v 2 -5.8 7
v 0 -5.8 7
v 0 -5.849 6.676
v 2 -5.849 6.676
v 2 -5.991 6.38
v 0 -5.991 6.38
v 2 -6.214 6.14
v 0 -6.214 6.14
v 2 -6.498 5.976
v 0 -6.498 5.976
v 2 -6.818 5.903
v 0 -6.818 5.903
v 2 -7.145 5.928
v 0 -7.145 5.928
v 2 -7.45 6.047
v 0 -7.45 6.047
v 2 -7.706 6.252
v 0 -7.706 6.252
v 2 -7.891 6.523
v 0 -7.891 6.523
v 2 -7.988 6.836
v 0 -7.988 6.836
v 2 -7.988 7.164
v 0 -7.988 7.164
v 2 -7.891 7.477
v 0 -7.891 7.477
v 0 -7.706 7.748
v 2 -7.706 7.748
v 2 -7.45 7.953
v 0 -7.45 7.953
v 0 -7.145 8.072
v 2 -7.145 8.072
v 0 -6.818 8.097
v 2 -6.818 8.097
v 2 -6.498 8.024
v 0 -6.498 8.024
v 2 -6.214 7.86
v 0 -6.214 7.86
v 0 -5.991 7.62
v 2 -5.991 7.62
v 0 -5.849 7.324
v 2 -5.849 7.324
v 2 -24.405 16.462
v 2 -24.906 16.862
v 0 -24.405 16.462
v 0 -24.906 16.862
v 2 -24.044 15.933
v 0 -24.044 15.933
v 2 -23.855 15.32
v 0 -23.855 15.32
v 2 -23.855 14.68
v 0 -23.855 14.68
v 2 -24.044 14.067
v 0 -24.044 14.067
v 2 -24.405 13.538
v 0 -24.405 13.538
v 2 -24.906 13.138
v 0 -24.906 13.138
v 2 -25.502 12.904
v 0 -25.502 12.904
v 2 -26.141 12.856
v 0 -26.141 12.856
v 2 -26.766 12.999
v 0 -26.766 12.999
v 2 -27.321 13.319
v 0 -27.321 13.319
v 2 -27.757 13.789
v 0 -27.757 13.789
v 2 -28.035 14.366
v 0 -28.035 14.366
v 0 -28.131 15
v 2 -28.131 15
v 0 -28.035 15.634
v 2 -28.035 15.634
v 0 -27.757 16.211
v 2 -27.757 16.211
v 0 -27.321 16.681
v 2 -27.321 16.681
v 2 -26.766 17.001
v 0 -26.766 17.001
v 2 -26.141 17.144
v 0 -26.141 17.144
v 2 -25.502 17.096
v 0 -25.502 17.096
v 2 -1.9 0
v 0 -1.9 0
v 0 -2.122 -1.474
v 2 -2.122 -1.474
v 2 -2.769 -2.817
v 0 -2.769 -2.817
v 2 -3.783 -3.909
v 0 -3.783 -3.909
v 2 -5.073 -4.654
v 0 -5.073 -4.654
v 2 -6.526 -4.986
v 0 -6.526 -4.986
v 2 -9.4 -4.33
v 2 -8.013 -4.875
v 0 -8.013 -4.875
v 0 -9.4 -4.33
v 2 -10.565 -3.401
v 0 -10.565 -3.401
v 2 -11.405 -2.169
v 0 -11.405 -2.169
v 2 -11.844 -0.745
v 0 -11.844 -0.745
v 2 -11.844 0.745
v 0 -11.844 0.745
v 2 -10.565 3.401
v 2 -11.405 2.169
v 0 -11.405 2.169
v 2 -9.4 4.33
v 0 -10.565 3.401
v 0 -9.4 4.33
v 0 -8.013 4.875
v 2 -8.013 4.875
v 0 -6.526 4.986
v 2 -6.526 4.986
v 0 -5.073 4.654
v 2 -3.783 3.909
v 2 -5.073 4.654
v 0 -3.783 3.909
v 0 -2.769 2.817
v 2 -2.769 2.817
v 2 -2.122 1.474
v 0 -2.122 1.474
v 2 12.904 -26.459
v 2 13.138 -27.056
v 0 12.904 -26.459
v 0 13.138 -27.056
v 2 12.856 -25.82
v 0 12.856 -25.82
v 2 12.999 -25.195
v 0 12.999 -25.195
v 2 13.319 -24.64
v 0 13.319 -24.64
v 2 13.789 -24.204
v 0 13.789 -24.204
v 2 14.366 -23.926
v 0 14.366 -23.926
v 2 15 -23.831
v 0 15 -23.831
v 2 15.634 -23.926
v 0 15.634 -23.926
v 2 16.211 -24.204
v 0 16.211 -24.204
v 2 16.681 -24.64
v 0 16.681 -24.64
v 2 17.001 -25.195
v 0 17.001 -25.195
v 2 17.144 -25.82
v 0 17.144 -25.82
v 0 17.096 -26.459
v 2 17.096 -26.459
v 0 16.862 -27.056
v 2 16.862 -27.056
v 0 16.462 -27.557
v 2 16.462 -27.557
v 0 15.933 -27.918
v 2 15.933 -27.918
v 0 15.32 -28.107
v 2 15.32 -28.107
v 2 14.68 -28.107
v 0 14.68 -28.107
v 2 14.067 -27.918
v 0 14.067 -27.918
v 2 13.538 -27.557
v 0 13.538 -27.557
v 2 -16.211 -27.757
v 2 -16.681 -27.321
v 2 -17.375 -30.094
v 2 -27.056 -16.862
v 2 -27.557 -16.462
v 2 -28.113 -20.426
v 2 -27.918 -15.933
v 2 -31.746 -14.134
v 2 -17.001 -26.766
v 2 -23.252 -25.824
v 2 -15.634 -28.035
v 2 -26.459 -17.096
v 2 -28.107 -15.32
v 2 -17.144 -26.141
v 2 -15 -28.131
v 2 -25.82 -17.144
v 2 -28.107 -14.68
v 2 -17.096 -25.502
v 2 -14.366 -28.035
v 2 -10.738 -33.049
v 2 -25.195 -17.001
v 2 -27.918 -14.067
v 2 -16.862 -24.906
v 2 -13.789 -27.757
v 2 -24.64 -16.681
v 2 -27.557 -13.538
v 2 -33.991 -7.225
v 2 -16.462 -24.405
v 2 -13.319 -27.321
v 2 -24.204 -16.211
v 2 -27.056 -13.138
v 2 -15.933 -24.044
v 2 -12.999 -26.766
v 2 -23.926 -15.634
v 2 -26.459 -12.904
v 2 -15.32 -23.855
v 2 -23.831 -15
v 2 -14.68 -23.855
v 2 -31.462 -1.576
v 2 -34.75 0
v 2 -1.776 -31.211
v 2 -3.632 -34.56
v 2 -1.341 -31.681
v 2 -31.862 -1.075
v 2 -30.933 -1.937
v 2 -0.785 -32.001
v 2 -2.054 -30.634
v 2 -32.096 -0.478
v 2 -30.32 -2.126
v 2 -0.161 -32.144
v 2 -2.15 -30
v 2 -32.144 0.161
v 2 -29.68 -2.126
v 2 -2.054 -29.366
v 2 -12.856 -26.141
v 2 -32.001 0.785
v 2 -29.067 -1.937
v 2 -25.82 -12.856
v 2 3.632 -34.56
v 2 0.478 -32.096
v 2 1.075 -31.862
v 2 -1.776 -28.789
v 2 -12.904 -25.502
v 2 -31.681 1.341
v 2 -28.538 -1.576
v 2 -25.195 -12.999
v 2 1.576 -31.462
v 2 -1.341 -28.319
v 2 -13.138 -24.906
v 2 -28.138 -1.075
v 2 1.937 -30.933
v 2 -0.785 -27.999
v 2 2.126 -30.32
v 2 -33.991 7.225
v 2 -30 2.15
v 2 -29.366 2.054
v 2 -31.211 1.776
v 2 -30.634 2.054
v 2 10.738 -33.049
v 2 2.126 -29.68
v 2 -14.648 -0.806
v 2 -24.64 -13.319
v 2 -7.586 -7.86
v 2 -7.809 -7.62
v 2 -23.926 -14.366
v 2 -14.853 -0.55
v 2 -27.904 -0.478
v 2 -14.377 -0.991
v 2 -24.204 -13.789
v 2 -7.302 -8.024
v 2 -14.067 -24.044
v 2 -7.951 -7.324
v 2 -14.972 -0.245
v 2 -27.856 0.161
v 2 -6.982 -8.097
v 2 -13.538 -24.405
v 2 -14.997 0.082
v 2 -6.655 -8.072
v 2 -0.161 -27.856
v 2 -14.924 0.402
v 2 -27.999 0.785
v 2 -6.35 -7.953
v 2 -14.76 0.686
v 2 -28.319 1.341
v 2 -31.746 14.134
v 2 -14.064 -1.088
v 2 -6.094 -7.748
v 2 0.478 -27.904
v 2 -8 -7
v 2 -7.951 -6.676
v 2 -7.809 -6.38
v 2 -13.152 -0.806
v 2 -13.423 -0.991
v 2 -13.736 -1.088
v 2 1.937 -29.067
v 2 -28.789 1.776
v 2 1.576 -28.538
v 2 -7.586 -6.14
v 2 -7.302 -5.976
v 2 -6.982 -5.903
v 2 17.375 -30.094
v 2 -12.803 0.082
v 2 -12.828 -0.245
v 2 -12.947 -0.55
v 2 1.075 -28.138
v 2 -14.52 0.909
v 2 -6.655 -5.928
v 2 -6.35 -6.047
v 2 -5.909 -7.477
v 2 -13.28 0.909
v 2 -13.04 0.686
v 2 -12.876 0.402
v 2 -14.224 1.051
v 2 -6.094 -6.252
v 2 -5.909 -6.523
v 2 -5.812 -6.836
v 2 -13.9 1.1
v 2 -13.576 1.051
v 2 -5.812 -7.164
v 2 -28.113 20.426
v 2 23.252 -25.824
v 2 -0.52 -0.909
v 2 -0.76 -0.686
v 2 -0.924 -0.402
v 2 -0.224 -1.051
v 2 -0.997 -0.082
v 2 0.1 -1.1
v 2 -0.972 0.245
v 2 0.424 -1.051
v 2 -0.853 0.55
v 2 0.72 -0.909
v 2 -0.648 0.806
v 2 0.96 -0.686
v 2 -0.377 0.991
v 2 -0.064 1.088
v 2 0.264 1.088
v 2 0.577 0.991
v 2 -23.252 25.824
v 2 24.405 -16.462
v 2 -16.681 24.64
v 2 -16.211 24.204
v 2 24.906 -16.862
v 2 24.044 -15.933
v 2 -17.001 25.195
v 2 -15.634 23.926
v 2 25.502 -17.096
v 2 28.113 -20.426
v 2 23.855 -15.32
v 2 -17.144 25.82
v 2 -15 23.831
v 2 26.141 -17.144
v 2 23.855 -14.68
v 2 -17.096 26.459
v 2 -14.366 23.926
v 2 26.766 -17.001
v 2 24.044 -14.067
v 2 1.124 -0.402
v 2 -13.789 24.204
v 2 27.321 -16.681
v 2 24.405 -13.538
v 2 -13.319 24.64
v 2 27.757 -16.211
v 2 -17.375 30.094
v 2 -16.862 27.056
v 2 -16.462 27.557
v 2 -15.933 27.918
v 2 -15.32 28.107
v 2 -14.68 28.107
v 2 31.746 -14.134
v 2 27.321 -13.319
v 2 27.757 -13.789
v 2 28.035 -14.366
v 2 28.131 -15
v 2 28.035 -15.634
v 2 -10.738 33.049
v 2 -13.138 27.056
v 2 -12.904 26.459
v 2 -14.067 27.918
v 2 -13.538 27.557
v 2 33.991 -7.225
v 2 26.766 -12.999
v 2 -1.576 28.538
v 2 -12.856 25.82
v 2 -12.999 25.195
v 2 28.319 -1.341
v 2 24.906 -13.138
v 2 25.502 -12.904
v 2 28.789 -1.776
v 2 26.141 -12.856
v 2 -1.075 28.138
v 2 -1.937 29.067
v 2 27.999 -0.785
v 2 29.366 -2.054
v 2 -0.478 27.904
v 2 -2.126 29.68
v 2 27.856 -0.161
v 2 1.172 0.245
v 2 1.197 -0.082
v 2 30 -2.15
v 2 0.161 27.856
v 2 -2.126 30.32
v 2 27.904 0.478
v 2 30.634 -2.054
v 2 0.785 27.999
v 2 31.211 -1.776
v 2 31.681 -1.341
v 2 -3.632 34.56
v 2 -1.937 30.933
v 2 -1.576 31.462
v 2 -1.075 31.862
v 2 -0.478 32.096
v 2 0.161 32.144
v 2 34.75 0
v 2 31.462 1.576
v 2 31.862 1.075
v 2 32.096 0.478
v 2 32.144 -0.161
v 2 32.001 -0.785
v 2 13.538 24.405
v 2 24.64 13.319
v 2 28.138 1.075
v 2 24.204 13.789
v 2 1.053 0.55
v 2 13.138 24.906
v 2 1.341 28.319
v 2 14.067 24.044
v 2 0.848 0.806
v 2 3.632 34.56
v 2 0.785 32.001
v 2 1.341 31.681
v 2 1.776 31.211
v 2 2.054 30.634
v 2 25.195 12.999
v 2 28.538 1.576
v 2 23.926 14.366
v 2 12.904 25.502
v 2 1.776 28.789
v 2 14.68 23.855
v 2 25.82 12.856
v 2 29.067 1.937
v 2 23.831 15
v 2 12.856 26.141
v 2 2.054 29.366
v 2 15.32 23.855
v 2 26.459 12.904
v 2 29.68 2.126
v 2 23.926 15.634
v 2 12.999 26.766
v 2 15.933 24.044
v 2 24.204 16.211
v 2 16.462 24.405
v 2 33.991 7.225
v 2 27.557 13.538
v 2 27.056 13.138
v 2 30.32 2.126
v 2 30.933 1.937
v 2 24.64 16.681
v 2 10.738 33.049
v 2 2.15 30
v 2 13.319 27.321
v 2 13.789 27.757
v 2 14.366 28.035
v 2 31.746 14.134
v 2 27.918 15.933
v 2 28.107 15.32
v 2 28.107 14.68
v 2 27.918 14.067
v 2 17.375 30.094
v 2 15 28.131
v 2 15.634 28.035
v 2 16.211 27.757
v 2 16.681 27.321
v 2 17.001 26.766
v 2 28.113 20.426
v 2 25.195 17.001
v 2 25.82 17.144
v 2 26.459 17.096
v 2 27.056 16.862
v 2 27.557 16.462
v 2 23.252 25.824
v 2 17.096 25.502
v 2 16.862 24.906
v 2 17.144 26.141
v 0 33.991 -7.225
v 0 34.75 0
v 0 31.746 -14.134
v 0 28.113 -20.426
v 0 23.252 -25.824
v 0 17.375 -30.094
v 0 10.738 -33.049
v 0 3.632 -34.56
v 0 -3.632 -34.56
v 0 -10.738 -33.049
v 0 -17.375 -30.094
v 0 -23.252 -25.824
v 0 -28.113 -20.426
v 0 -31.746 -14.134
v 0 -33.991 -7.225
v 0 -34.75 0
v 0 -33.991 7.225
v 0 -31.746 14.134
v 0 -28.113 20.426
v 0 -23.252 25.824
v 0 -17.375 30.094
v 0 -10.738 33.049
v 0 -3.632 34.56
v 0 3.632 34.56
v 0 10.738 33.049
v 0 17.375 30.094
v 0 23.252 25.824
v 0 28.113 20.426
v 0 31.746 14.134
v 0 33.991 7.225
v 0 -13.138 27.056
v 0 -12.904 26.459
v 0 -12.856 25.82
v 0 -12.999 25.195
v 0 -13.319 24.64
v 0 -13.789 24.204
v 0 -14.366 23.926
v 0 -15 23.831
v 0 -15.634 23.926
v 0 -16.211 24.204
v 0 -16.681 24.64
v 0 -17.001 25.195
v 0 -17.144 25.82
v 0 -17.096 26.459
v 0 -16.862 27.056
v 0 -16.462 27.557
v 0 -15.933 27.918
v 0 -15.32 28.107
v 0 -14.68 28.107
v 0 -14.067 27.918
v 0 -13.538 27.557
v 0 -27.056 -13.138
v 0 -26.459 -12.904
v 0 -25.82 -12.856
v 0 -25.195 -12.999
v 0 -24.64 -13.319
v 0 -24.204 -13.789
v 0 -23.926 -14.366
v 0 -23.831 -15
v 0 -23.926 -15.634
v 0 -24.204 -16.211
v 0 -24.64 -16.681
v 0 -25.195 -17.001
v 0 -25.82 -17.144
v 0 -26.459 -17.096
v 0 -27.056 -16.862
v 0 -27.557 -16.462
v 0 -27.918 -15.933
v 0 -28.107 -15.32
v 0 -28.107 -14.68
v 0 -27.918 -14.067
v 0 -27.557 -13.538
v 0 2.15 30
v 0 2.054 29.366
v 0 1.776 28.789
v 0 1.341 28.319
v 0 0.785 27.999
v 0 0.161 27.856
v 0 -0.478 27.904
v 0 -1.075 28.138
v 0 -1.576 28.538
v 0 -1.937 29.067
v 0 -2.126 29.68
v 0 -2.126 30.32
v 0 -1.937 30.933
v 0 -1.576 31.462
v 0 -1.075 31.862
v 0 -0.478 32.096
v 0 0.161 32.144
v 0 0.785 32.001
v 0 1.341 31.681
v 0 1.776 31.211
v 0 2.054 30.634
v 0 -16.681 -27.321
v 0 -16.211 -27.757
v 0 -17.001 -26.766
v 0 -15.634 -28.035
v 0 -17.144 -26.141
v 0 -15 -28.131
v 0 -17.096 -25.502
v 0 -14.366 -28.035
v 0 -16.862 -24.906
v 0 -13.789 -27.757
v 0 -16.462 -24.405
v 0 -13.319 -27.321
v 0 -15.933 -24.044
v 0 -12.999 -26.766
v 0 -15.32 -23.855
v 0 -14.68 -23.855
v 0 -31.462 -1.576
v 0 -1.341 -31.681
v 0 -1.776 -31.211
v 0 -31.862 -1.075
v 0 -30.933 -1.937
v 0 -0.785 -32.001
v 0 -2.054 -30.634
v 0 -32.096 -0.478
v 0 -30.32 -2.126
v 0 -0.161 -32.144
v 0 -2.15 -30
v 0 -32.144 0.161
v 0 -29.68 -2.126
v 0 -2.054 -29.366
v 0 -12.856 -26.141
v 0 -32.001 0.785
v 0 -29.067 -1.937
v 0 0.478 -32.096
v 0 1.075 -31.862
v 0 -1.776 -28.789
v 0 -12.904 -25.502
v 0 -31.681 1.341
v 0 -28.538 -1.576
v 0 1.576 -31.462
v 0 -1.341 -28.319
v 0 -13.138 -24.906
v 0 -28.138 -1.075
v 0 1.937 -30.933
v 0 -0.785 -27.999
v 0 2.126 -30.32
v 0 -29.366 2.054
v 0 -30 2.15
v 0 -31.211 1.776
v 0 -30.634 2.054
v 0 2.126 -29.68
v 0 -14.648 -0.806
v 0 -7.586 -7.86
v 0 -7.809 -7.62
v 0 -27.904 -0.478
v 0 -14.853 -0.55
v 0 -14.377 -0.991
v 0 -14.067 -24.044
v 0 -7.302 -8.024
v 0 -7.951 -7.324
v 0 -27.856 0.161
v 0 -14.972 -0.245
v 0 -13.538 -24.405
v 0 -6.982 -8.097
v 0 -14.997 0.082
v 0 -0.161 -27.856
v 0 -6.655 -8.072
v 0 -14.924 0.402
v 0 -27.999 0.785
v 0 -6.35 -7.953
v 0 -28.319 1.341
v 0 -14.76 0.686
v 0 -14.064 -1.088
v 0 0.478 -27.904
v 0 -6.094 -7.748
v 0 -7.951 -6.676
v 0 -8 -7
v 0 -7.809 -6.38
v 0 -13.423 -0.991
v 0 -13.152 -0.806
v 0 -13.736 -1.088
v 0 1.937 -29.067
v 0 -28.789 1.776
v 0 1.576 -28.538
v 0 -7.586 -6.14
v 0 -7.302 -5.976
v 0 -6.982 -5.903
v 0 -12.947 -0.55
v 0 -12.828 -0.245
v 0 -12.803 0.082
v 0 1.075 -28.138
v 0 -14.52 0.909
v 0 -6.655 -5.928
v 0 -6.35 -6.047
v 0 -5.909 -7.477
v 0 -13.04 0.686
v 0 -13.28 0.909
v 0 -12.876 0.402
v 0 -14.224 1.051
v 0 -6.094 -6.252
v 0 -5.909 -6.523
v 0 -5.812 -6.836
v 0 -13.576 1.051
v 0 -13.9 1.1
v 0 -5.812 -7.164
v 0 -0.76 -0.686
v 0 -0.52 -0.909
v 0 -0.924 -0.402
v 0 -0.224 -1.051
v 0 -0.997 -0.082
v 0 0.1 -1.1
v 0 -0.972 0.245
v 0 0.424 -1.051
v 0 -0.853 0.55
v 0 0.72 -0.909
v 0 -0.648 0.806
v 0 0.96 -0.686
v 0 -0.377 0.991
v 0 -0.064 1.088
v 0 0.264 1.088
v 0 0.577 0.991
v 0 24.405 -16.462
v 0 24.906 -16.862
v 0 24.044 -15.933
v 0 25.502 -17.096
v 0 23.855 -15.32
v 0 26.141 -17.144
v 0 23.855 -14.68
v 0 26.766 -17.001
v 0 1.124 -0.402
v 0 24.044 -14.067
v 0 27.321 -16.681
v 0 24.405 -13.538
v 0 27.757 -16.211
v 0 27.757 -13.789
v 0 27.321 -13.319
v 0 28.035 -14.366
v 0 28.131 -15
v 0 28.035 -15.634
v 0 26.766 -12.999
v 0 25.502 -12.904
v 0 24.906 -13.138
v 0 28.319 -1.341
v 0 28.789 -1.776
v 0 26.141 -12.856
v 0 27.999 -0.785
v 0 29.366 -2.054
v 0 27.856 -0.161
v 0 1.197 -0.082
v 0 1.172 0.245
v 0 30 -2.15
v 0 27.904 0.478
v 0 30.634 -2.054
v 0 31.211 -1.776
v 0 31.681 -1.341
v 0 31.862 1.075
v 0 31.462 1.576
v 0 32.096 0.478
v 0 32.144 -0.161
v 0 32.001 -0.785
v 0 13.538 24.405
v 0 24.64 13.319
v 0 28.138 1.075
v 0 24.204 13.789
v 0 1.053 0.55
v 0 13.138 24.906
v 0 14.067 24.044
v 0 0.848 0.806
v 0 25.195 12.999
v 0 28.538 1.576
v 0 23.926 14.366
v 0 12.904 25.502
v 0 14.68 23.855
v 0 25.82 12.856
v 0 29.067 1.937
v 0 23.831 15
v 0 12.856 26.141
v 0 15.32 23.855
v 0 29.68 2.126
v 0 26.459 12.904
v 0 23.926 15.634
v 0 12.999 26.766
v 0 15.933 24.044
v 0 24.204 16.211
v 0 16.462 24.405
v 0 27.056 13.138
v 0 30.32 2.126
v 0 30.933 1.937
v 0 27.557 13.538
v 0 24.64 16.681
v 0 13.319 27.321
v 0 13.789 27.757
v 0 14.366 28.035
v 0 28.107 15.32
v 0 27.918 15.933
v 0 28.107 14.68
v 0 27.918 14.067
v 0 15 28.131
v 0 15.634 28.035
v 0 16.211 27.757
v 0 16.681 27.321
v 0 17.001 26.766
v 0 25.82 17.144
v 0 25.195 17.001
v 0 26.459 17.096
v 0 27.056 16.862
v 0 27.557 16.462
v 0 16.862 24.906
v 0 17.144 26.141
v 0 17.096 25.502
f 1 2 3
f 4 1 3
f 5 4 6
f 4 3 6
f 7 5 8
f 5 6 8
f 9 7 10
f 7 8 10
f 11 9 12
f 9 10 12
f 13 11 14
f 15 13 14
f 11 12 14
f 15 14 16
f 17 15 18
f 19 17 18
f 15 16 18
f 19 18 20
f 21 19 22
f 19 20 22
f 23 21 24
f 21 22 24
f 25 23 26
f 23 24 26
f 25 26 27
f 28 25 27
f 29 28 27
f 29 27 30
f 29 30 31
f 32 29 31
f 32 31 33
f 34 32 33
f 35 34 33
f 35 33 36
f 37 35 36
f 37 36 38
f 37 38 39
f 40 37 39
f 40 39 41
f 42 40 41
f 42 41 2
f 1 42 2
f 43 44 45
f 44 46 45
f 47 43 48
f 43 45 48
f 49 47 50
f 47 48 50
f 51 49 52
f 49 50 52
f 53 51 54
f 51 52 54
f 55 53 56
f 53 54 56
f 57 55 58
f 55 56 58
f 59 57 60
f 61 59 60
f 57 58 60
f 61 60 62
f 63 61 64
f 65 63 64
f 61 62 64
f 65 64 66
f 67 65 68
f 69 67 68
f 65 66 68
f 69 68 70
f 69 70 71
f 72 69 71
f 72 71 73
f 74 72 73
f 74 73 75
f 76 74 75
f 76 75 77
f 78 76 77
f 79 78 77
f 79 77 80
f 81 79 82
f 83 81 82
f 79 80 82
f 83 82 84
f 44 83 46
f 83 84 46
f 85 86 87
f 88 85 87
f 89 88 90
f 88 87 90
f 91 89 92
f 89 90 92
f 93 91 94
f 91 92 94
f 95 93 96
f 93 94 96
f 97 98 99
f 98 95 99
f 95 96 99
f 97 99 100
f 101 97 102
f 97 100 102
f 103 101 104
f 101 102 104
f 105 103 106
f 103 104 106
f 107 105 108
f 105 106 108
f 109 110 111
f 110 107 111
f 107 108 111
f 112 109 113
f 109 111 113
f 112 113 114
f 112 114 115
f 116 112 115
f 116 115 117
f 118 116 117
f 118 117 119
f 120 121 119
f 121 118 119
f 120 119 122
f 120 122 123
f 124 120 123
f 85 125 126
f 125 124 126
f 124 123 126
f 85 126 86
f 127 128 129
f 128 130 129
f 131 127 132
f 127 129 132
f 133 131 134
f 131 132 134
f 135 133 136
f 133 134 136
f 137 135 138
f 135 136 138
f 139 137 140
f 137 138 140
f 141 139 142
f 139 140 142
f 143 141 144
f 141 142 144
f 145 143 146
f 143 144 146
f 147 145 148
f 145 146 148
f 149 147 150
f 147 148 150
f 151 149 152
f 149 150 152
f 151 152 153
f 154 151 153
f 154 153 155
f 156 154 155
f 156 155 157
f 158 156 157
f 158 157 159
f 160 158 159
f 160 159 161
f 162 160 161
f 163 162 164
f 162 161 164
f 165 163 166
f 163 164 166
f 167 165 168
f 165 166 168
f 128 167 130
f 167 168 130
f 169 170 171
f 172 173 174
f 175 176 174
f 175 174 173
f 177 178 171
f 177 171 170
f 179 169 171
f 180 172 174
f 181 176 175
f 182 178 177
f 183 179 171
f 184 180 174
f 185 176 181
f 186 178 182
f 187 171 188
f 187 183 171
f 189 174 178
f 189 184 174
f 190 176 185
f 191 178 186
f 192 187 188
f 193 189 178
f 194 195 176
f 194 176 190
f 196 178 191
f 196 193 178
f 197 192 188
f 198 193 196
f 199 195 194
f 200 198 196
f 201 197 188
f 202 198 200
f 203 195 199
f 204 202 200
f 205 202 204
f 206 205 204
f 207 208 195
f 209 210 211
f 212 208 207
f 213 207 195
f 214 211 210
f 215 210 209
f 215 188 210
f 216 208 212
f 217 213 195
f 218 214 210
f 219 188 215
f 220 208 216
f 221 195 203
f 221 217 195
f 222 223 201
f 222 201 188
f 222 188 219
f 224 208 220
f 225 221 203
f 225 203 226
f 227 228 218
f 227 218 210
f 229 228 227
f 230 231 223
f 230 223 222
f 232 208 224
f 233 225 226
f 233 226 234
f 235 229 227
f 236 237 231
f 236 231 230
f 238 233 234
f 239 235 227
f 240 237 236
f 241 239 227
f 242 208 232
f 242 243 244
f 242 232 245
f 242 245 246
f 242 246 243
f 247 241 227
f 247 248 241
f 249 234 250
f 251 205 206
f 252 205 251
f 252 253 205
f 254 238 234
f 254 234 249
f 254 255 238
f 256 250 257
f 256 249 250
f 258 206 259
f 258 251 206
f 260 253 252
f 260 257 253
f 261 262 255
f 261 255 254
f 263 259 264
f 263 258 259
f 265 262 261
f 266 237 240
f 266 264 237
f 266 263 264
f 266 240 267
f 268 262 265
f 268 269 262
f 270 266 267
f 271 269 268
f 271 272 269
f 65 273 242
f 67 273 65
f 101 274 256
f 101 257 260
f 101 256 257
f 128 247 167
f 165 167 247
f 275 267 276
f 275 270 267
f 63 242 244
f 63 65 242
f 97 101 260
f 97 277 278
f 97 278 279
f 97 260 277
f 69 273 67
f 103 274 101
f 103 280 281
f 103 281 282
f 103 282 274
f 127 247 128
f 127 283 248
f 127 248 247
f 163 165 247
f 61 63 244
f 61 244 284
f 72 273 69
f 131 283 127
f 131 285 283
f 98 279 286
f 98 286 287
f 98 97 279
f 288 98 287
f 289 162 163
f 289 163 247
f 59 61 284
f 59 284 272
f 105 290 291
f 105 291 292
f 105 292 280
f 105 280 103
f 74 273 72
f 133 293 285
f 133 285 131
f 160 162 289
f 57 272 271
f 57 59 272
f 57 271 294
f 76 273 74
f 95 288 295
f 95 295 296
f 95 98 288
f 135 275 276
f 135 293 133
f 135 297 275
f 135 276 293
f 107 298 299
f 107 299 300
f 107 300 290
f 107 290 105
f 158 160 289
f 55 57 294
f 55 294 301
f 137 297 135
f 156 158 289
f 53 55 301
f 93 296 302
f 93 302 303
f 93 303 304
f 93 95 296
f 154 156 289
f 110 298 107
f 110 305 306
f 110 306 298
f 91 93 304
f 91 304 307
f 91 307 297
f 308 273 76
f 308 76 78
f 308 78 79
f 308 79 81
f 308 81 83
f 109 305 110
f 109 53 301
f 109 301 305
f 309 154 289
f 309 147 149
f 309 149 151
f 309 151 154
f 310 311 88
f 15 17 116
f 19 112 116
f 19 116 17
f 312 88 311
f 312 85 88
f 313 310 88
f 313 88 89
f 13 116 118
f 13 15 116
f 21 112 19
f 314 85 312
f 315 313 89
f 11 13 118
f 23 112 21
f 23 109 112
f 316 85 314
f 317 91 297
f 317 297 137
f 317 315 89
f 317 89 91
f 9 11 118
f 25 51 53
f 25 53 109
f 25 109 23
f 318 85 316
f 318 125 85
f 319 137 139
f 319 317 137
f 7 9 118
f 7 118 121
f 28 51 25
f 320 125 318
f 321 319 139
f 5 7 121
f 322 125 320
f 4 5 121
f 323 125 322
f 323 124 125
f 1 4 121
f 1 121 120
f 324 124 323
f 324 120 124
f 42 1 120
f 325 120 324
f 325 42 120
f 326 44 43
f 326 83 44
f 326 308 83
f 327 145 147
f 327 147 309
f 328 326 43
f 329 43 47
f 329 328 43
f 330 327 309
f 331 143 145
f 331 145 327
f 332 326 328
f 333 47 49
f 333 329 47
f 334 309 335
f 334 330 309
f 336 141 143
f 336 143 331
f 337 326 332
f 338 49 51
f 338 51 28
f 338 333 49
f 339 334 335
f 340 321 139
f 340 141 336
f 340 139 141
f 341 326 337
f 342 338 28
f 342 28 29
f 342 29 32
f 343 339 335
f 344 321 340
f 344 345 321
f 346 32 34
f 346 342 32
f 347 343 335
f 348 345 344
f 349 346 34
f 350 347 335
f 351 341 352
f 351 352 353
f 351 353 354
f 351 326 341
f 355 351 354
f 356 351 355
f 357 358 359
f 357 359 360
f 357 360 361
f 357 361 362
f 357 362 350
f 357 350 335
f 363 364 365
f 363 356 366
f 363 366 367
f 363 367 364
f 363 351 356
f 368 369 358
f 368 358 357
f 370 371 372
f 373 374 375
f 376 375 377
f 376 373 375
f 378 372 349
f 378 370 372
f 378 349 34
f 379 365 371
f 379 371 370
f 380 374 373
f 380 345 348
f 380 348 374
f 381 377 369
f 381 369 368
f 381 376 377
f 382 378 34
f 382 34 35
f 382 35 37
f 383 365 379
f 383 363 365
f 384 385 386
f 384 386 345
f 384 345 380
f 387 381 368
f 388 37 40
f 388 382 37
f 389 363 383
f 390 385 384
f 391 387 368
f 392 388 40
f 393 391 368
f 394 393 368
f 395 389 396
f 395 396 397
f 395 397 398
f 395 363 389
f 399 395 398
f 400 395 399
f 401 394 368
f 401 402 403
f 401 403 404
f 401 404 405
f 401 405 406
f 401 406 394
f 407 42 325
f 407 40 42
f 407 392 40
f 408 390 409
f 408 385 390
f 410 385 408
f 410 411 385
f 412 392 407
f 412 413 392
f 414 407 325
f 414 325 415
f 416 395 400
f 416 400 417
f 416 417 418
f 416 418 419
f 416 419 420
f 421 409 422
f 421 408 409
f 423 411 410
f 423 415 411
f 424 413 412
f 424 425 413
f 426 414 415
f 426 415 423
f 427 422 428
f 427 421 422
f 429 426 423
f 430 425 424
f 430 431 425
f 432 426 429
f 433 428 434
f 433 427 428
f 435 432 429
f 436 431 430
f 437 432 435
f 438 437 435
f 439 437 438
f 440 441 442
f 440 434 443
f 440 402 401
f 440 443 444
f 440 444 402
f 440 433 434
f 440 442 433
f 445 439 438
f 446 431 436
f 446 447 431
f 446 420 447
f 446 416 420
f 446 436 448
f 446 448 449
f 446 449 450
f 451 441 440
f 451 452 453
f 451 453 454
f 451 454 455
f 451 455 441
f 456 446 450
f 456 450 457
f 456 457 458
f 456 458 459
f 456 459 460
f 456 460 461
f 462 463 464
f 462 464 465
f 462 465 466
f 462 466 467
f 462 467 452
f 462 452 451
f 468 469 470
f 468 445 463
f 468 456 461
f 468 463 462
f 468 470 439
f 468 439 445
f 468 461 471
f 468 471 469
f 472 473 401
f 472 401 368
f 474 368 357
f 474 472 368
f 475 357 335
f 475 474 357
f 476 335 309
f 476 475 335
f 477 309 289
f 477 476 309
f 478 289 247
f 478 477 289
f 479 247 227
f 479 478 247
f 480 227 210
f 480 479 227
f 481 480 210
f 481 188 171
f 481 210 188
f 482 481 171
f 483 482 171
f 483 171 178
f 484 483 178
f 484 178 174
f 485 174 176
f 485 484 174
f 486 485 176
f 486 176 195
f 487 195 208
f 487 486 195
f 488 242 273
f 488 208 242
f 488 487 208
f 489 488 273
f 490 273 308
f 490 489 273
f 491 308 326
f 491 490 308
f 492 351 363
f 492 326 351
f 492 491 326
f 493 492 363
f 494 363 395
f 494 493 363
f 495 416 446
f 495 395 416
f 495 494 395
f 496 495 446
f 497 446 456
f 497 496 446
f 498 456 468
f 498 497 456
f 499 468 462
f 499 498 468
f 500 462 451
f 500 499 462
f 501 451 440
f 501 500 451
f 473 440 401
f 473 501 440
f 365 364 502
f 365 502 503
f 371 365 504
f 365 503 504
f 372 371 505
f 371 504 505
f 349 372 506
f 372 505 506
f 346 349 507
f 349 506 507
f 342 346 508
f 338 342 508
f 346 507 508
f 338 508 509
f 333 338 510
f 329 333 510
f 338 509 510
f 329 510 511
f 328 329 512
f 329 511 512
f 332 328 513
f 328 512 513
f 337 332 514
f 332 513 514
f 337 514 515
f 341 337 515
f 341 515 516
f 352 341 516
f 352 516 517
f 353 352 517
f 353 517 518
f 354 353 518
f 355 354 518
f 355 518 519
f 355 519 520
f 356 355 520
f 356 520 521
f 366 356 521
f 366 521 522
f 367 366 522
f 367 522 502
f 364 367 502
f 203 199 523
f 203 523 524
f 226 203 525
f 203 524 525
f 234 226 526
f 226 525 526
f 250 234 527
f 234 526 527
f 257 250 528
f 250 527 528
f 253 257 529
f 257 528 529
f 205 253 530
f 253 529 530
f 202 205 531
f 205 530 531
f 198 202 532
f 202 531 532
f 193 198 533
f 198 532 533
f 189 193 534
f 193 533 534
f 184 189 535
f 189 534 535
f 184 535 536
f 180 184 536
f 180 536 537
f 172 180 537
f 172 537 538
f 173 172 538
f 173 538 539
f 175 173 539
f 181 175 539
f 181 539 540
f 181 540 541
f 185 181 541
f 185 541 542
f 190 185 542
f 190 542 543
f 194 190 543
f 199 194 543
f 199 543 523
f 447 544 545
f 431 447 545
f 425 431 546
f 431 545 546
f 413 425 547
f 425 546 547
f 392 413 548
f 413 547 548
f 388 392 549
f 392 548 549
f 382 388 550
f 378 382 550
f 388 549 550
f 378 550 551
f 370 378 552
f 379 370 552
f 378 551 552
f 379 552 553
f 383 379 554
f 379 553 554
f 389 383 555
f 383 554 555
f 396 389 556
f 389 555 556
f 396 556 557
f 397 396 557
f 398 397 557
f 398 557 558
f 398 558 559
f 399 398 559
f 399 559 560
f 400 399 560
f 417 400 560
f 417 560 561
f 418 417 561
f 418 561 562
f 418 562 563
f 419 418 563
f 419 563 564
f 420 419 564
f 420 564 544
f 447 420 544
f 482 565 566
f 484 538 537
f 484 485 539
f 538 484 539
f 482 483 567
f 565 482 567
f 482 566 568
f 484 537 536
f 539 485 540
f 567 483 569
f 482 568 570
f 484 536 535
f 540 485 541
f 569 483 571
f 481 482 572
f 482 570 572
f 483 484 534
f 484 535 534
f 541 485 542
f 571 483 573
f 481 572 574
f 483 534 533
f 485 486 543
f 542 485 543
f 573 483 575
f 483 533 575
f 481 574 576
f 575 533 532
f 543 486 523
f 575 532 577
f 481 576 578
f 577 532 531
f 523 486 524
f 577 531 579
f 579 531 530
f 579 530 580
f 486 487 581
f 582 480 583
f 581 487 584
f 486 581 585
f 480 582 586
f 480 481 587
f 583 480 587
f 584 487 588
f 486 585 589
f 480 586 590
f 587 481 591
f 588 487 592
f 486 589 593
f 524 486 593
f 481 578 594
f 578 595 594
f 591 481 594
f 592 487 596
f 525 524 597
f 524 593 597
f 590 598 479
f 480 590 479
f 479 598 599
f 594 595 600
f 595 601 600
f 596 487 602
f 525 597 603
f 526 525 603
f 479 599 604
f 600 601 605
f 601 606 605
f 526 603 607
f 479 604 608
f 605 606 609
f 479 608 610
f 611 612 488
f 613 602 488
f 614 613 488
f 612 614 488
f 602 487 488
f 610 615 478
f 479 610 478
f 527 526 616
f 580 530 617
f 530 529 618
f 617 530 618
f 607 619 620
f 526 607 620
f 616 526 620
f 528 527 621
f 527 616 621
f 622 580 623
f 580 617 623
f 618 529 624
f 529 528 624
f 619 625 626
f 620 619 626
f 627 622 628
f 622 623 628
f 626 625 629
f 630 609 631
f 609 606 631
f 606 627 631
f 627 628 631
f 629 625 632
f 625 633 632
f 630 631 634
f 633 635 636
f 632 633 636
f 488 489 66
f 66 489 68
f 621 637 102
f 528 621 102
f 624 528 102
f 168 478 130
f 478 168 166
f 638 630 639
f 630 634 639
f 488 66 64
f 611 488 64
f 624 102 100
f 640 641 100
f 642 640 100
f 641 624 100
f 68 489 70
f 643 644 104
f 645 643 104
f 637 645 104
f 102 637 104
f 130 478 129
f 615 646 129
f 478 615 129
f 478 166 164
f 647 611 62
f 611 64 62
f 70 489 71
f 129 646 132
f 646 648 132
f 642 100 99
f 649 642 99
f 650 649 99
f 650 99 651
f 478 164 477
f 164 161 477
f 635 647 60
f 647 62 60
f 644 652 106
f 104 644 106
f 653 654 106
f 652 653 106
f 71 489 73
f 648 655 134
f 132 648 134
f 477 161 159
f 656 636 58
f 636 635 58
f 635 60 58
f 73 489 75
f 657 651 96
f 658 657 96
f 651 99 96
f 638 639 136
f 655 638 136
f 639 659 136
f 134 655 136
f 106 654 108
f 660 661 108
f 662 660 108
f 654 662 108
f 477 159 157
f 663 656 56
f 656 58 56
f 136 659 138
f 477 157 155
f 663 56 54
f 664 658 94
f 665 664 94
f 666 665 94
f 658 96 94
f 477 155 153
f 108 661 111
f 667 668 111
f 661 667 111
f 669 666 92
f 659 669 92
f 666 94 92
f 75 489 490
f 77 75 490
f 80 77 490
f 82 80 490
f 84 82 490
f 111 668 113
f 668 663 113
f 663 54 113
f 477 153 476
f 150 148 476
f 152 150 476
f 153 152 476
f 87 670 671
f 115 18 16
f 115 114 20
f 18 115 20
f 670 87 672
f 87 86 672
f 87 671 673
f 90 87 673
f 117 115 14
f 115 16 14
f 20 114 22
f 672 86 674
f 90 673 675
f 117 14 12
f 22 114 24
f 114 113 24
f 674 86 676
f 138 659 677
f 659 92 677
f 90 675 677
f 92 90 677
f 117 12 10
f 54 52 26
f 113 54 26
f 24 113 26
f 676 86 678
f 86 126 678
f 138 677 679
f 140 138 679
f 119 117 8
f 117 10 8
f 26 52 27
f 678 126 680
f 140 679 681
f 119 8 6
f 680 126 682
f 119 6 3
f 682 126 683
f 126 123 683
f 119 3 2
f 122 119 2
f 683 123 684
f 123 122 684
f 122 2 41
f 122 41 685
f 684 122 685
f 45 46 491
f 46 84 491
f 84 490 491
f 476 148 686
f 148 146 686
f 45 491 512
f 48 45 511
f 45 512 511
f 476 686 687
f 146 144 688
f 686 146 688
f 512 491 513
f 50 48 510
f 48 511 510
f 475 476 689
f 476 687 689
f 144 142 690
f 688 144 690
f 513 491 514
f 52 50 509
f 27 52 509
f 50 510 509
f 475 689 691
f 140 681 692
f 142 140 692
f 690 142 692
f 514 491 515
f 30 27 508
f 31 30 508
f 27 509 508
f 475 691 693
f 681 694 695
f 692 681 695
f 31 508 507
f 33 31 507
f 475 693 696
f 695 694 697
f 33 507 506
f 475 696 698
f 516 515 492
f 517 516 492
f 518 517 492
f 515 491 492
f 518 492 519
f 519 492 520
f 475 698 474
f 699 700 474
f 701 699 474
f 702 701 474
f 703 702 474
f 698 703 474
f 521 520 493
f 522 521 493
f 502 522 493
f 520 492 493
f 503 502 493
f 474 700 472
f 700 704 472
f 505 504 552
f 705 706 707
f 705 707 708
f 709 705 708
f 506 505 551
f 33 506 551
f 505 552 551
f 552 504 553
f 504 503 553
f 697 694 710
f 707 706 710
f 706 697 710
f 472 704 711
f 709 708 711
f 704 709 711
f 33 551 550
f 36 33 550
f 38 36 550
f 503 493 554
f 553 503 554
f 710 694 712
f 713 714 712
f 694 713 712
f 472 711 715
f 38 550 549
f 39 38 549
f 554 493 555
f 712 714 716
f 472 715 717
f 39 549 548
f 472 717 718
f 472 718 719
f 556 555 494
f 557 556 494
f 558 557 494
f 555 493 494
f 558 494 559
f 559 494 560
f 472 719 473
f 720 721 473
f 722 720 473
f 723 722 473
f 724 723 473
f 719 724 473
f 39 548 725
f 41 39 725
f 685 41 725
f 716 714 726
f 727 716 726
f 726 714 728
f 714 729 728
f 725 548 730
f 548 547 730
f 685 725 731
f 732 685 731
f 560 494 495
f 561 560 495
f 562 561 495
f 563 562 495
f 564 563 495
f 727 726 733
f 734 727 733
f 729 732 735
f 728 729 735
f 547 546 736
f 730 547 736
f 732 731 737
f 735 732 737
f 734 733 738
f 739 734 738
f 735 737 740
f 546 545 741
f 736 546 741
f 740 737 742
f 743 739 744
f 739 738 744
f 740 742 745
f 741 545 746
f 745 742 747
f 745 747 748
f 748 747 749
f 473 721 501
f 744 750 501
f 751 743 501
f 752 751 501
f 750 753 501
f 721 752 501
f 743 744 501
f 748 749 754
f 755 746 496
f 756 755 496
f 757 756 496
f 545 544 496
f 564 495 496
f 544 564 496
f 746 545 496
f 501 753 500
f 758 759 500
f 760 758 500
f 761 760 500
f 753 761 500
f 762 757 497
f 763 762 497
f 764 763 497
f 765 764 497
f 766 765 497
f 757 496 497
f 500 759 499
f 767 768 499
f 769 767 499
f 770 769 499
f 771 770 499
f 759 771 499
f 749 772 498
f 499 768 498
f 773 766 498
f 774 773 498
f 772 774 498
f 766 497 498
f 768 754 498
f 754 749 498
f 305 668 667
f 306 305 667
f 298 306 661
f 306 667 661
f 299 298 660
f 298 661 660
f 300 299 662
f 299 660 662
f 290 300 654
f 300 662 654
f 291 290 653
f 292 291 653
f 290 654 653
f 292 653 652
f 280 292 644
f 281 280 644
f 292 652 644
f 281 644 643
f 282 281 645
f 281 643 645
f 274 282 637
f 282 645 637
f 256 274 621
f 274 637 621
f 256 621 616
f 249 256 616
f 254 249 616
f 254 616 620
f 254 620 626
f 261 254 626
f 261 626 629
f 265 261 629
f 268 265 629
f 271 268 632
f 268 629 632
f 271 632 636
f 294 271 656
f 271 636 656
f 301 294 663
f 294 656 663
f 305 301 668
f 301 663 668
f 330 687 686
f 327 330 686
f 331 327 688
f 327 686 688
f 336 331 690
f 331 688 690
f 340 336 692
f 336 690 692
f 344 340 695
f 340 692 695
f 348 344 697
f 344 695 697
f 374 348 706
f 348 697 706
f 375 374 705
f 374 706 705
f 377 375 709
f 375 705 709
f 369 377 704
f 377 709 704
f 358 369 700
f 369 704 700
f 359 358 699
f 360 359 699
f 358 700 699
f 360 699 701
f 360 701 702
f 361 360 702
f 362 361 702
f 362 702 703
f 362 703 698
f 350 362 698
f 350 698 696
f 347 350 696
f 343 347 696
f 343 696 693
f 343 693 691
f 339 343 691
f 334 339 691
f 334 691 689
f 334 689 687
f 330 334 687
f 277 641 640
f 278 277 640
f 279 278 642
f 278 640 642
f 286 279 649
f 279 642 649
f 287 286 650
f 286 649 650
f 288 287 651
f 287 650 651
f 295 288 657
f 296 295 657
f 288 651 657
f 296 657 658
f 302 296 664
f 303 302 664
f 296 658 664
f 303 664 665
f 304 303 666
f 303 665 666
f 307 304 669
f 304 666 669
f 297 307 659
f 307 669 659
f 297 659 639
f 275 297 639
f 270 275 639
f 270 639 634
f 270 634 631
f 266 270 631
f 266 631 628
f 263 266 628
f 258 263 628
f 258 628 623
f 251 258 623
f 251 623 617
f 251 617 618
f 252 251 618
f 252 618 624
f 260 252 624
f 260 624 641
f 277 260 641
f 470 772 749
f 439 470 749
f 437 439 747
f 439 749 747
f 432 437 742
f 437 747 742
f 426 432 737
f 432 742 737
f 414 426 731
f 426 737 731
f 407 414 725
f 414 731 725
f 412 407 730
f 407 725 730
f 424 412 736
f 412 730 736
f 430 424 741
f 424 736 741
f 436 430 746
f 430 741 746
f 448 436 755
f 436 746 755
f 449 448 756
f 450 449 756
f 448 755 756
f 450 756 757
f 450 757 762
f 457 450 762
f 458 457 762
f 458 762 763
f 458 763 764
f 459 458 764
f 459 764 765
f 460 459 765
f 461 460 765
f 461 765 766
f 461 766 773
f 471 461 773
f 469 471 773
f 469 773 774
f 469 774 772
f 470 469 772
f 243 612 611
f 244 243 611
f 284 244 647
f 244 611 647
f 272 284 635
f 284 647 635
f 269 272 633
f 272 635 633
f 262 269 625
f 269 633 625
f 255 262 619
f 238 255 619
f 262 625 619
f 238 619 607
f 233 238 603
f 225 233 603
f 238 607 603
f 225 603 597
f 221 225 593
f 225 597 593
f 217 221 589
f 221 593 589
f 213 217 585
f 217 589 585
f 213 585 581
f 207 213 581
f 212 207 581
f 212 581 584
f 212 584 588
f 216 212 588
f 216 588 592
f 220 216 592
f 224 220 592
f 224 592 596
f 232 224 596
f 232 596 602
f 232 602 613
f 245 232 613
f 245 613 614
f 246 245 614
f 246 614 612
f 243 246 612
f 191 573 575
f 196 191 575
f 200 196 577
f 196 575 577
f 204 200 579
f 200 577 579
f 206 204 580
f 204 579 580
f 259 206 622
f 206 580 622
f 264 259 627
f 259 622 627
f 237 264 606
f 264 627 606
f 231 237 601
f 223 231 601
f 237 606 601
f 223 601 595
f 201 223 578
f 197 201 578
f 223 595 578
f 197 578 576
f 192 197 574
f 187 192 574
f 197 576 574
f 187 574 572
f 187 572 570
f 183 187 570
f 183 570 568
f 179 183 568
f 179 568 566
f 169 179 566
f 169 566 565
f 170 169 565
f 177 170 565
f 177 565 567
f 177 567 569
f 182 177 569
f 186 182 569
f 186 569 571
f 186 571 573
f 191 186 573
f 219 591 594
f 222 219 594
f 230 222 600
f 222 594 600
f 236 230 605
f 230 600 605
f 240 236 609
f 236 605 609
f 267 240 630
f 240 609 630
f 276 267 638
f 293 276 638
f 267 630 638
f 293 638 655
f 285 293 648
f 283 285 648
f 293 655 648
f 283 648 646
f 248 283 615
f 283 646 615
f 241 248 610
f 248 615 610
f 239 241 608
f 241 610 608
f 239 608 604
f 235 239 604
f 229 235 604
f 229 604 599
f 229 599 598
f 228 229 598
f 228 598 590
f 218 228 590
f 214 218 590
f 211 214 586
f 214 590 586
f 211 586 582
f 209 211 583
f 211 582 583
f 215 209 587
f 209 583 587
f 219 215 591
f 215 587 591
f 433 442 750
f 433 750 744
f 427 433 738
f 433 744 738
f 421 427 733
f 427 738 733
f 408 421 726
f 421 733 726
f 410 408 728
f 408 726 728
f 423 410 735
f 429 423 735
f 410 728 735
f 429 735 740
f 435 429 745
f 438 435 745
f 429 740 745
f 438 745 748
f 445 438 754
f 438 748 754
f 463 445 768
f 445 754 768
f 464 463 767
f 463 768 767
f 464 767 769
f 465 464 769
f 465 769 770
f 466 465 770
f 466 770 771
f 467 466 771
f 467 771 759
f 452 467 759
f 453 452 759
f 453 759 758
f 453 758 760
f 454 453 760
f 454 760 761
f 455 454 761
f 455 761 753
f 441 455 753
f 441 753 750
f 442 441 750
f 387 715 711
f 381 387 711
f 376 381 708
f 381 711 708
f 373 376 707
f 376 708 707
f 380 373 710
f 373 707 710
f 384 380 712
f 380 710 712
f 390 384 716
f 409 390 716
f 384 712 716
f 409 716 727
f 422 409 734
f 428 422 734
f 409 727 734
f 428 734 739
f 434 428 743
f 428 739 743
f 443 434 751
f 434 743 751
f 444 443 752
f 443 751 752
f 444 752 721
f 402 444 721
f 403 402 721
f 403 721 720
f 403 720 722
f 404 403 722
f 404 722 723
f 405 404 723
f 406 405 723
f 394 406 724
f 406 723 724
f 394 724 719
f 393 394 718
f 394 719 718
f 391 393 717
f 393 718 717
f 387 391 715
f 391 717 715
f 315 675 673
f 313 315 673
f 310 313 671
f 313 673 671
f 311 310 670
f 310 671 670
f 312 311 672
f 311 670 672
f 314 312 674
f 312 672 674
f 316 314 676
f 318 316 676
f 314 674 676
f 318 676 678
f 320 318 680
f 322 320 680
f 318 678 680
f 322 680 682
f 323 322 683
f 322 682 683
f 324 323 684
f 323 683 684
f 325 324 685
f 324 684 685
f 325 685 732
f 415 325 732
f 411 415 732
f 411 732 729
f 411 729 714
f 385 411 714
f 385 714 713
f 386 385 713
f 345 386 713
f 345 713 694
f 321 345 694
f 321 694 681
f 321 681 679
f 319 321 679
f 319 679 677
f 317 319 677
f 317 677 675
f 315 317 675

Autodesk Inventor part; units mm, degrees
ref_plane "YZ Plane" through (0, 0, 0) normal (1, 0, 0) x (0, 1, 0)
ref_plane "XZ Plane" through (0, 0, 0) normal (0, 1, 0) x (-1, 0, 0)
ref_plane "XY Plane" through (0, 0, 0) normal (0, 0, 1) x (1, 0, 0)
sketch "Sketch1" plane through (0, 0, 0) normal (1, 0, 0) x (0, 1, 0)
  circle A0 centre (0, 0) radius 34.75
  circle A1 centre (-6.9, 0) radius 5
  dimension "d0" = 69.5
  dimension "d1" = 10
  dimension "d2" = 6.9
extrude "Extrusion1" add sketch "Sketch1" along normal blind 2
sketch "Sketch2" plane through (2, 0, 0) normal (1, 0, 0) x (0, 0, -1)
  circle A0 centre (0, 0) radius 30
  point P0 (0, 30)
  dimension "d5" = 60
hole "Hole1" at (2, 30, 0) direction (-1, 0, 0) diameter 4.3 depth 10
pattern_circular "Circular Pattern1" count 12 over 360 about axis through (0, 0, 0) along (1, 0, 0) of "Hole1"
sketch "Sketch3" plane through (2, 0, 0) normal (1, 0, 0) x (0, 0, -1)
  circle A0 centre (0, -6.9) radius 5 projected
  circle A1 centre (0, -6.9) radius 7
  point P0 (0, 0)
  point P1 (0, 0.1)
  dimension "d16" = 14
hole "Hole2" at (2, 0.1, 0) direction (-1, 0, 0) diameter 2.2 depth 10
pattern_circular "Circular Pattern2" count 4 over 360 about axis through (0, -6.9, 0) along (1, 0, 0) of "Hole2"
properties part number "sample-transfer_plate" material "ABS Plastic orange"
